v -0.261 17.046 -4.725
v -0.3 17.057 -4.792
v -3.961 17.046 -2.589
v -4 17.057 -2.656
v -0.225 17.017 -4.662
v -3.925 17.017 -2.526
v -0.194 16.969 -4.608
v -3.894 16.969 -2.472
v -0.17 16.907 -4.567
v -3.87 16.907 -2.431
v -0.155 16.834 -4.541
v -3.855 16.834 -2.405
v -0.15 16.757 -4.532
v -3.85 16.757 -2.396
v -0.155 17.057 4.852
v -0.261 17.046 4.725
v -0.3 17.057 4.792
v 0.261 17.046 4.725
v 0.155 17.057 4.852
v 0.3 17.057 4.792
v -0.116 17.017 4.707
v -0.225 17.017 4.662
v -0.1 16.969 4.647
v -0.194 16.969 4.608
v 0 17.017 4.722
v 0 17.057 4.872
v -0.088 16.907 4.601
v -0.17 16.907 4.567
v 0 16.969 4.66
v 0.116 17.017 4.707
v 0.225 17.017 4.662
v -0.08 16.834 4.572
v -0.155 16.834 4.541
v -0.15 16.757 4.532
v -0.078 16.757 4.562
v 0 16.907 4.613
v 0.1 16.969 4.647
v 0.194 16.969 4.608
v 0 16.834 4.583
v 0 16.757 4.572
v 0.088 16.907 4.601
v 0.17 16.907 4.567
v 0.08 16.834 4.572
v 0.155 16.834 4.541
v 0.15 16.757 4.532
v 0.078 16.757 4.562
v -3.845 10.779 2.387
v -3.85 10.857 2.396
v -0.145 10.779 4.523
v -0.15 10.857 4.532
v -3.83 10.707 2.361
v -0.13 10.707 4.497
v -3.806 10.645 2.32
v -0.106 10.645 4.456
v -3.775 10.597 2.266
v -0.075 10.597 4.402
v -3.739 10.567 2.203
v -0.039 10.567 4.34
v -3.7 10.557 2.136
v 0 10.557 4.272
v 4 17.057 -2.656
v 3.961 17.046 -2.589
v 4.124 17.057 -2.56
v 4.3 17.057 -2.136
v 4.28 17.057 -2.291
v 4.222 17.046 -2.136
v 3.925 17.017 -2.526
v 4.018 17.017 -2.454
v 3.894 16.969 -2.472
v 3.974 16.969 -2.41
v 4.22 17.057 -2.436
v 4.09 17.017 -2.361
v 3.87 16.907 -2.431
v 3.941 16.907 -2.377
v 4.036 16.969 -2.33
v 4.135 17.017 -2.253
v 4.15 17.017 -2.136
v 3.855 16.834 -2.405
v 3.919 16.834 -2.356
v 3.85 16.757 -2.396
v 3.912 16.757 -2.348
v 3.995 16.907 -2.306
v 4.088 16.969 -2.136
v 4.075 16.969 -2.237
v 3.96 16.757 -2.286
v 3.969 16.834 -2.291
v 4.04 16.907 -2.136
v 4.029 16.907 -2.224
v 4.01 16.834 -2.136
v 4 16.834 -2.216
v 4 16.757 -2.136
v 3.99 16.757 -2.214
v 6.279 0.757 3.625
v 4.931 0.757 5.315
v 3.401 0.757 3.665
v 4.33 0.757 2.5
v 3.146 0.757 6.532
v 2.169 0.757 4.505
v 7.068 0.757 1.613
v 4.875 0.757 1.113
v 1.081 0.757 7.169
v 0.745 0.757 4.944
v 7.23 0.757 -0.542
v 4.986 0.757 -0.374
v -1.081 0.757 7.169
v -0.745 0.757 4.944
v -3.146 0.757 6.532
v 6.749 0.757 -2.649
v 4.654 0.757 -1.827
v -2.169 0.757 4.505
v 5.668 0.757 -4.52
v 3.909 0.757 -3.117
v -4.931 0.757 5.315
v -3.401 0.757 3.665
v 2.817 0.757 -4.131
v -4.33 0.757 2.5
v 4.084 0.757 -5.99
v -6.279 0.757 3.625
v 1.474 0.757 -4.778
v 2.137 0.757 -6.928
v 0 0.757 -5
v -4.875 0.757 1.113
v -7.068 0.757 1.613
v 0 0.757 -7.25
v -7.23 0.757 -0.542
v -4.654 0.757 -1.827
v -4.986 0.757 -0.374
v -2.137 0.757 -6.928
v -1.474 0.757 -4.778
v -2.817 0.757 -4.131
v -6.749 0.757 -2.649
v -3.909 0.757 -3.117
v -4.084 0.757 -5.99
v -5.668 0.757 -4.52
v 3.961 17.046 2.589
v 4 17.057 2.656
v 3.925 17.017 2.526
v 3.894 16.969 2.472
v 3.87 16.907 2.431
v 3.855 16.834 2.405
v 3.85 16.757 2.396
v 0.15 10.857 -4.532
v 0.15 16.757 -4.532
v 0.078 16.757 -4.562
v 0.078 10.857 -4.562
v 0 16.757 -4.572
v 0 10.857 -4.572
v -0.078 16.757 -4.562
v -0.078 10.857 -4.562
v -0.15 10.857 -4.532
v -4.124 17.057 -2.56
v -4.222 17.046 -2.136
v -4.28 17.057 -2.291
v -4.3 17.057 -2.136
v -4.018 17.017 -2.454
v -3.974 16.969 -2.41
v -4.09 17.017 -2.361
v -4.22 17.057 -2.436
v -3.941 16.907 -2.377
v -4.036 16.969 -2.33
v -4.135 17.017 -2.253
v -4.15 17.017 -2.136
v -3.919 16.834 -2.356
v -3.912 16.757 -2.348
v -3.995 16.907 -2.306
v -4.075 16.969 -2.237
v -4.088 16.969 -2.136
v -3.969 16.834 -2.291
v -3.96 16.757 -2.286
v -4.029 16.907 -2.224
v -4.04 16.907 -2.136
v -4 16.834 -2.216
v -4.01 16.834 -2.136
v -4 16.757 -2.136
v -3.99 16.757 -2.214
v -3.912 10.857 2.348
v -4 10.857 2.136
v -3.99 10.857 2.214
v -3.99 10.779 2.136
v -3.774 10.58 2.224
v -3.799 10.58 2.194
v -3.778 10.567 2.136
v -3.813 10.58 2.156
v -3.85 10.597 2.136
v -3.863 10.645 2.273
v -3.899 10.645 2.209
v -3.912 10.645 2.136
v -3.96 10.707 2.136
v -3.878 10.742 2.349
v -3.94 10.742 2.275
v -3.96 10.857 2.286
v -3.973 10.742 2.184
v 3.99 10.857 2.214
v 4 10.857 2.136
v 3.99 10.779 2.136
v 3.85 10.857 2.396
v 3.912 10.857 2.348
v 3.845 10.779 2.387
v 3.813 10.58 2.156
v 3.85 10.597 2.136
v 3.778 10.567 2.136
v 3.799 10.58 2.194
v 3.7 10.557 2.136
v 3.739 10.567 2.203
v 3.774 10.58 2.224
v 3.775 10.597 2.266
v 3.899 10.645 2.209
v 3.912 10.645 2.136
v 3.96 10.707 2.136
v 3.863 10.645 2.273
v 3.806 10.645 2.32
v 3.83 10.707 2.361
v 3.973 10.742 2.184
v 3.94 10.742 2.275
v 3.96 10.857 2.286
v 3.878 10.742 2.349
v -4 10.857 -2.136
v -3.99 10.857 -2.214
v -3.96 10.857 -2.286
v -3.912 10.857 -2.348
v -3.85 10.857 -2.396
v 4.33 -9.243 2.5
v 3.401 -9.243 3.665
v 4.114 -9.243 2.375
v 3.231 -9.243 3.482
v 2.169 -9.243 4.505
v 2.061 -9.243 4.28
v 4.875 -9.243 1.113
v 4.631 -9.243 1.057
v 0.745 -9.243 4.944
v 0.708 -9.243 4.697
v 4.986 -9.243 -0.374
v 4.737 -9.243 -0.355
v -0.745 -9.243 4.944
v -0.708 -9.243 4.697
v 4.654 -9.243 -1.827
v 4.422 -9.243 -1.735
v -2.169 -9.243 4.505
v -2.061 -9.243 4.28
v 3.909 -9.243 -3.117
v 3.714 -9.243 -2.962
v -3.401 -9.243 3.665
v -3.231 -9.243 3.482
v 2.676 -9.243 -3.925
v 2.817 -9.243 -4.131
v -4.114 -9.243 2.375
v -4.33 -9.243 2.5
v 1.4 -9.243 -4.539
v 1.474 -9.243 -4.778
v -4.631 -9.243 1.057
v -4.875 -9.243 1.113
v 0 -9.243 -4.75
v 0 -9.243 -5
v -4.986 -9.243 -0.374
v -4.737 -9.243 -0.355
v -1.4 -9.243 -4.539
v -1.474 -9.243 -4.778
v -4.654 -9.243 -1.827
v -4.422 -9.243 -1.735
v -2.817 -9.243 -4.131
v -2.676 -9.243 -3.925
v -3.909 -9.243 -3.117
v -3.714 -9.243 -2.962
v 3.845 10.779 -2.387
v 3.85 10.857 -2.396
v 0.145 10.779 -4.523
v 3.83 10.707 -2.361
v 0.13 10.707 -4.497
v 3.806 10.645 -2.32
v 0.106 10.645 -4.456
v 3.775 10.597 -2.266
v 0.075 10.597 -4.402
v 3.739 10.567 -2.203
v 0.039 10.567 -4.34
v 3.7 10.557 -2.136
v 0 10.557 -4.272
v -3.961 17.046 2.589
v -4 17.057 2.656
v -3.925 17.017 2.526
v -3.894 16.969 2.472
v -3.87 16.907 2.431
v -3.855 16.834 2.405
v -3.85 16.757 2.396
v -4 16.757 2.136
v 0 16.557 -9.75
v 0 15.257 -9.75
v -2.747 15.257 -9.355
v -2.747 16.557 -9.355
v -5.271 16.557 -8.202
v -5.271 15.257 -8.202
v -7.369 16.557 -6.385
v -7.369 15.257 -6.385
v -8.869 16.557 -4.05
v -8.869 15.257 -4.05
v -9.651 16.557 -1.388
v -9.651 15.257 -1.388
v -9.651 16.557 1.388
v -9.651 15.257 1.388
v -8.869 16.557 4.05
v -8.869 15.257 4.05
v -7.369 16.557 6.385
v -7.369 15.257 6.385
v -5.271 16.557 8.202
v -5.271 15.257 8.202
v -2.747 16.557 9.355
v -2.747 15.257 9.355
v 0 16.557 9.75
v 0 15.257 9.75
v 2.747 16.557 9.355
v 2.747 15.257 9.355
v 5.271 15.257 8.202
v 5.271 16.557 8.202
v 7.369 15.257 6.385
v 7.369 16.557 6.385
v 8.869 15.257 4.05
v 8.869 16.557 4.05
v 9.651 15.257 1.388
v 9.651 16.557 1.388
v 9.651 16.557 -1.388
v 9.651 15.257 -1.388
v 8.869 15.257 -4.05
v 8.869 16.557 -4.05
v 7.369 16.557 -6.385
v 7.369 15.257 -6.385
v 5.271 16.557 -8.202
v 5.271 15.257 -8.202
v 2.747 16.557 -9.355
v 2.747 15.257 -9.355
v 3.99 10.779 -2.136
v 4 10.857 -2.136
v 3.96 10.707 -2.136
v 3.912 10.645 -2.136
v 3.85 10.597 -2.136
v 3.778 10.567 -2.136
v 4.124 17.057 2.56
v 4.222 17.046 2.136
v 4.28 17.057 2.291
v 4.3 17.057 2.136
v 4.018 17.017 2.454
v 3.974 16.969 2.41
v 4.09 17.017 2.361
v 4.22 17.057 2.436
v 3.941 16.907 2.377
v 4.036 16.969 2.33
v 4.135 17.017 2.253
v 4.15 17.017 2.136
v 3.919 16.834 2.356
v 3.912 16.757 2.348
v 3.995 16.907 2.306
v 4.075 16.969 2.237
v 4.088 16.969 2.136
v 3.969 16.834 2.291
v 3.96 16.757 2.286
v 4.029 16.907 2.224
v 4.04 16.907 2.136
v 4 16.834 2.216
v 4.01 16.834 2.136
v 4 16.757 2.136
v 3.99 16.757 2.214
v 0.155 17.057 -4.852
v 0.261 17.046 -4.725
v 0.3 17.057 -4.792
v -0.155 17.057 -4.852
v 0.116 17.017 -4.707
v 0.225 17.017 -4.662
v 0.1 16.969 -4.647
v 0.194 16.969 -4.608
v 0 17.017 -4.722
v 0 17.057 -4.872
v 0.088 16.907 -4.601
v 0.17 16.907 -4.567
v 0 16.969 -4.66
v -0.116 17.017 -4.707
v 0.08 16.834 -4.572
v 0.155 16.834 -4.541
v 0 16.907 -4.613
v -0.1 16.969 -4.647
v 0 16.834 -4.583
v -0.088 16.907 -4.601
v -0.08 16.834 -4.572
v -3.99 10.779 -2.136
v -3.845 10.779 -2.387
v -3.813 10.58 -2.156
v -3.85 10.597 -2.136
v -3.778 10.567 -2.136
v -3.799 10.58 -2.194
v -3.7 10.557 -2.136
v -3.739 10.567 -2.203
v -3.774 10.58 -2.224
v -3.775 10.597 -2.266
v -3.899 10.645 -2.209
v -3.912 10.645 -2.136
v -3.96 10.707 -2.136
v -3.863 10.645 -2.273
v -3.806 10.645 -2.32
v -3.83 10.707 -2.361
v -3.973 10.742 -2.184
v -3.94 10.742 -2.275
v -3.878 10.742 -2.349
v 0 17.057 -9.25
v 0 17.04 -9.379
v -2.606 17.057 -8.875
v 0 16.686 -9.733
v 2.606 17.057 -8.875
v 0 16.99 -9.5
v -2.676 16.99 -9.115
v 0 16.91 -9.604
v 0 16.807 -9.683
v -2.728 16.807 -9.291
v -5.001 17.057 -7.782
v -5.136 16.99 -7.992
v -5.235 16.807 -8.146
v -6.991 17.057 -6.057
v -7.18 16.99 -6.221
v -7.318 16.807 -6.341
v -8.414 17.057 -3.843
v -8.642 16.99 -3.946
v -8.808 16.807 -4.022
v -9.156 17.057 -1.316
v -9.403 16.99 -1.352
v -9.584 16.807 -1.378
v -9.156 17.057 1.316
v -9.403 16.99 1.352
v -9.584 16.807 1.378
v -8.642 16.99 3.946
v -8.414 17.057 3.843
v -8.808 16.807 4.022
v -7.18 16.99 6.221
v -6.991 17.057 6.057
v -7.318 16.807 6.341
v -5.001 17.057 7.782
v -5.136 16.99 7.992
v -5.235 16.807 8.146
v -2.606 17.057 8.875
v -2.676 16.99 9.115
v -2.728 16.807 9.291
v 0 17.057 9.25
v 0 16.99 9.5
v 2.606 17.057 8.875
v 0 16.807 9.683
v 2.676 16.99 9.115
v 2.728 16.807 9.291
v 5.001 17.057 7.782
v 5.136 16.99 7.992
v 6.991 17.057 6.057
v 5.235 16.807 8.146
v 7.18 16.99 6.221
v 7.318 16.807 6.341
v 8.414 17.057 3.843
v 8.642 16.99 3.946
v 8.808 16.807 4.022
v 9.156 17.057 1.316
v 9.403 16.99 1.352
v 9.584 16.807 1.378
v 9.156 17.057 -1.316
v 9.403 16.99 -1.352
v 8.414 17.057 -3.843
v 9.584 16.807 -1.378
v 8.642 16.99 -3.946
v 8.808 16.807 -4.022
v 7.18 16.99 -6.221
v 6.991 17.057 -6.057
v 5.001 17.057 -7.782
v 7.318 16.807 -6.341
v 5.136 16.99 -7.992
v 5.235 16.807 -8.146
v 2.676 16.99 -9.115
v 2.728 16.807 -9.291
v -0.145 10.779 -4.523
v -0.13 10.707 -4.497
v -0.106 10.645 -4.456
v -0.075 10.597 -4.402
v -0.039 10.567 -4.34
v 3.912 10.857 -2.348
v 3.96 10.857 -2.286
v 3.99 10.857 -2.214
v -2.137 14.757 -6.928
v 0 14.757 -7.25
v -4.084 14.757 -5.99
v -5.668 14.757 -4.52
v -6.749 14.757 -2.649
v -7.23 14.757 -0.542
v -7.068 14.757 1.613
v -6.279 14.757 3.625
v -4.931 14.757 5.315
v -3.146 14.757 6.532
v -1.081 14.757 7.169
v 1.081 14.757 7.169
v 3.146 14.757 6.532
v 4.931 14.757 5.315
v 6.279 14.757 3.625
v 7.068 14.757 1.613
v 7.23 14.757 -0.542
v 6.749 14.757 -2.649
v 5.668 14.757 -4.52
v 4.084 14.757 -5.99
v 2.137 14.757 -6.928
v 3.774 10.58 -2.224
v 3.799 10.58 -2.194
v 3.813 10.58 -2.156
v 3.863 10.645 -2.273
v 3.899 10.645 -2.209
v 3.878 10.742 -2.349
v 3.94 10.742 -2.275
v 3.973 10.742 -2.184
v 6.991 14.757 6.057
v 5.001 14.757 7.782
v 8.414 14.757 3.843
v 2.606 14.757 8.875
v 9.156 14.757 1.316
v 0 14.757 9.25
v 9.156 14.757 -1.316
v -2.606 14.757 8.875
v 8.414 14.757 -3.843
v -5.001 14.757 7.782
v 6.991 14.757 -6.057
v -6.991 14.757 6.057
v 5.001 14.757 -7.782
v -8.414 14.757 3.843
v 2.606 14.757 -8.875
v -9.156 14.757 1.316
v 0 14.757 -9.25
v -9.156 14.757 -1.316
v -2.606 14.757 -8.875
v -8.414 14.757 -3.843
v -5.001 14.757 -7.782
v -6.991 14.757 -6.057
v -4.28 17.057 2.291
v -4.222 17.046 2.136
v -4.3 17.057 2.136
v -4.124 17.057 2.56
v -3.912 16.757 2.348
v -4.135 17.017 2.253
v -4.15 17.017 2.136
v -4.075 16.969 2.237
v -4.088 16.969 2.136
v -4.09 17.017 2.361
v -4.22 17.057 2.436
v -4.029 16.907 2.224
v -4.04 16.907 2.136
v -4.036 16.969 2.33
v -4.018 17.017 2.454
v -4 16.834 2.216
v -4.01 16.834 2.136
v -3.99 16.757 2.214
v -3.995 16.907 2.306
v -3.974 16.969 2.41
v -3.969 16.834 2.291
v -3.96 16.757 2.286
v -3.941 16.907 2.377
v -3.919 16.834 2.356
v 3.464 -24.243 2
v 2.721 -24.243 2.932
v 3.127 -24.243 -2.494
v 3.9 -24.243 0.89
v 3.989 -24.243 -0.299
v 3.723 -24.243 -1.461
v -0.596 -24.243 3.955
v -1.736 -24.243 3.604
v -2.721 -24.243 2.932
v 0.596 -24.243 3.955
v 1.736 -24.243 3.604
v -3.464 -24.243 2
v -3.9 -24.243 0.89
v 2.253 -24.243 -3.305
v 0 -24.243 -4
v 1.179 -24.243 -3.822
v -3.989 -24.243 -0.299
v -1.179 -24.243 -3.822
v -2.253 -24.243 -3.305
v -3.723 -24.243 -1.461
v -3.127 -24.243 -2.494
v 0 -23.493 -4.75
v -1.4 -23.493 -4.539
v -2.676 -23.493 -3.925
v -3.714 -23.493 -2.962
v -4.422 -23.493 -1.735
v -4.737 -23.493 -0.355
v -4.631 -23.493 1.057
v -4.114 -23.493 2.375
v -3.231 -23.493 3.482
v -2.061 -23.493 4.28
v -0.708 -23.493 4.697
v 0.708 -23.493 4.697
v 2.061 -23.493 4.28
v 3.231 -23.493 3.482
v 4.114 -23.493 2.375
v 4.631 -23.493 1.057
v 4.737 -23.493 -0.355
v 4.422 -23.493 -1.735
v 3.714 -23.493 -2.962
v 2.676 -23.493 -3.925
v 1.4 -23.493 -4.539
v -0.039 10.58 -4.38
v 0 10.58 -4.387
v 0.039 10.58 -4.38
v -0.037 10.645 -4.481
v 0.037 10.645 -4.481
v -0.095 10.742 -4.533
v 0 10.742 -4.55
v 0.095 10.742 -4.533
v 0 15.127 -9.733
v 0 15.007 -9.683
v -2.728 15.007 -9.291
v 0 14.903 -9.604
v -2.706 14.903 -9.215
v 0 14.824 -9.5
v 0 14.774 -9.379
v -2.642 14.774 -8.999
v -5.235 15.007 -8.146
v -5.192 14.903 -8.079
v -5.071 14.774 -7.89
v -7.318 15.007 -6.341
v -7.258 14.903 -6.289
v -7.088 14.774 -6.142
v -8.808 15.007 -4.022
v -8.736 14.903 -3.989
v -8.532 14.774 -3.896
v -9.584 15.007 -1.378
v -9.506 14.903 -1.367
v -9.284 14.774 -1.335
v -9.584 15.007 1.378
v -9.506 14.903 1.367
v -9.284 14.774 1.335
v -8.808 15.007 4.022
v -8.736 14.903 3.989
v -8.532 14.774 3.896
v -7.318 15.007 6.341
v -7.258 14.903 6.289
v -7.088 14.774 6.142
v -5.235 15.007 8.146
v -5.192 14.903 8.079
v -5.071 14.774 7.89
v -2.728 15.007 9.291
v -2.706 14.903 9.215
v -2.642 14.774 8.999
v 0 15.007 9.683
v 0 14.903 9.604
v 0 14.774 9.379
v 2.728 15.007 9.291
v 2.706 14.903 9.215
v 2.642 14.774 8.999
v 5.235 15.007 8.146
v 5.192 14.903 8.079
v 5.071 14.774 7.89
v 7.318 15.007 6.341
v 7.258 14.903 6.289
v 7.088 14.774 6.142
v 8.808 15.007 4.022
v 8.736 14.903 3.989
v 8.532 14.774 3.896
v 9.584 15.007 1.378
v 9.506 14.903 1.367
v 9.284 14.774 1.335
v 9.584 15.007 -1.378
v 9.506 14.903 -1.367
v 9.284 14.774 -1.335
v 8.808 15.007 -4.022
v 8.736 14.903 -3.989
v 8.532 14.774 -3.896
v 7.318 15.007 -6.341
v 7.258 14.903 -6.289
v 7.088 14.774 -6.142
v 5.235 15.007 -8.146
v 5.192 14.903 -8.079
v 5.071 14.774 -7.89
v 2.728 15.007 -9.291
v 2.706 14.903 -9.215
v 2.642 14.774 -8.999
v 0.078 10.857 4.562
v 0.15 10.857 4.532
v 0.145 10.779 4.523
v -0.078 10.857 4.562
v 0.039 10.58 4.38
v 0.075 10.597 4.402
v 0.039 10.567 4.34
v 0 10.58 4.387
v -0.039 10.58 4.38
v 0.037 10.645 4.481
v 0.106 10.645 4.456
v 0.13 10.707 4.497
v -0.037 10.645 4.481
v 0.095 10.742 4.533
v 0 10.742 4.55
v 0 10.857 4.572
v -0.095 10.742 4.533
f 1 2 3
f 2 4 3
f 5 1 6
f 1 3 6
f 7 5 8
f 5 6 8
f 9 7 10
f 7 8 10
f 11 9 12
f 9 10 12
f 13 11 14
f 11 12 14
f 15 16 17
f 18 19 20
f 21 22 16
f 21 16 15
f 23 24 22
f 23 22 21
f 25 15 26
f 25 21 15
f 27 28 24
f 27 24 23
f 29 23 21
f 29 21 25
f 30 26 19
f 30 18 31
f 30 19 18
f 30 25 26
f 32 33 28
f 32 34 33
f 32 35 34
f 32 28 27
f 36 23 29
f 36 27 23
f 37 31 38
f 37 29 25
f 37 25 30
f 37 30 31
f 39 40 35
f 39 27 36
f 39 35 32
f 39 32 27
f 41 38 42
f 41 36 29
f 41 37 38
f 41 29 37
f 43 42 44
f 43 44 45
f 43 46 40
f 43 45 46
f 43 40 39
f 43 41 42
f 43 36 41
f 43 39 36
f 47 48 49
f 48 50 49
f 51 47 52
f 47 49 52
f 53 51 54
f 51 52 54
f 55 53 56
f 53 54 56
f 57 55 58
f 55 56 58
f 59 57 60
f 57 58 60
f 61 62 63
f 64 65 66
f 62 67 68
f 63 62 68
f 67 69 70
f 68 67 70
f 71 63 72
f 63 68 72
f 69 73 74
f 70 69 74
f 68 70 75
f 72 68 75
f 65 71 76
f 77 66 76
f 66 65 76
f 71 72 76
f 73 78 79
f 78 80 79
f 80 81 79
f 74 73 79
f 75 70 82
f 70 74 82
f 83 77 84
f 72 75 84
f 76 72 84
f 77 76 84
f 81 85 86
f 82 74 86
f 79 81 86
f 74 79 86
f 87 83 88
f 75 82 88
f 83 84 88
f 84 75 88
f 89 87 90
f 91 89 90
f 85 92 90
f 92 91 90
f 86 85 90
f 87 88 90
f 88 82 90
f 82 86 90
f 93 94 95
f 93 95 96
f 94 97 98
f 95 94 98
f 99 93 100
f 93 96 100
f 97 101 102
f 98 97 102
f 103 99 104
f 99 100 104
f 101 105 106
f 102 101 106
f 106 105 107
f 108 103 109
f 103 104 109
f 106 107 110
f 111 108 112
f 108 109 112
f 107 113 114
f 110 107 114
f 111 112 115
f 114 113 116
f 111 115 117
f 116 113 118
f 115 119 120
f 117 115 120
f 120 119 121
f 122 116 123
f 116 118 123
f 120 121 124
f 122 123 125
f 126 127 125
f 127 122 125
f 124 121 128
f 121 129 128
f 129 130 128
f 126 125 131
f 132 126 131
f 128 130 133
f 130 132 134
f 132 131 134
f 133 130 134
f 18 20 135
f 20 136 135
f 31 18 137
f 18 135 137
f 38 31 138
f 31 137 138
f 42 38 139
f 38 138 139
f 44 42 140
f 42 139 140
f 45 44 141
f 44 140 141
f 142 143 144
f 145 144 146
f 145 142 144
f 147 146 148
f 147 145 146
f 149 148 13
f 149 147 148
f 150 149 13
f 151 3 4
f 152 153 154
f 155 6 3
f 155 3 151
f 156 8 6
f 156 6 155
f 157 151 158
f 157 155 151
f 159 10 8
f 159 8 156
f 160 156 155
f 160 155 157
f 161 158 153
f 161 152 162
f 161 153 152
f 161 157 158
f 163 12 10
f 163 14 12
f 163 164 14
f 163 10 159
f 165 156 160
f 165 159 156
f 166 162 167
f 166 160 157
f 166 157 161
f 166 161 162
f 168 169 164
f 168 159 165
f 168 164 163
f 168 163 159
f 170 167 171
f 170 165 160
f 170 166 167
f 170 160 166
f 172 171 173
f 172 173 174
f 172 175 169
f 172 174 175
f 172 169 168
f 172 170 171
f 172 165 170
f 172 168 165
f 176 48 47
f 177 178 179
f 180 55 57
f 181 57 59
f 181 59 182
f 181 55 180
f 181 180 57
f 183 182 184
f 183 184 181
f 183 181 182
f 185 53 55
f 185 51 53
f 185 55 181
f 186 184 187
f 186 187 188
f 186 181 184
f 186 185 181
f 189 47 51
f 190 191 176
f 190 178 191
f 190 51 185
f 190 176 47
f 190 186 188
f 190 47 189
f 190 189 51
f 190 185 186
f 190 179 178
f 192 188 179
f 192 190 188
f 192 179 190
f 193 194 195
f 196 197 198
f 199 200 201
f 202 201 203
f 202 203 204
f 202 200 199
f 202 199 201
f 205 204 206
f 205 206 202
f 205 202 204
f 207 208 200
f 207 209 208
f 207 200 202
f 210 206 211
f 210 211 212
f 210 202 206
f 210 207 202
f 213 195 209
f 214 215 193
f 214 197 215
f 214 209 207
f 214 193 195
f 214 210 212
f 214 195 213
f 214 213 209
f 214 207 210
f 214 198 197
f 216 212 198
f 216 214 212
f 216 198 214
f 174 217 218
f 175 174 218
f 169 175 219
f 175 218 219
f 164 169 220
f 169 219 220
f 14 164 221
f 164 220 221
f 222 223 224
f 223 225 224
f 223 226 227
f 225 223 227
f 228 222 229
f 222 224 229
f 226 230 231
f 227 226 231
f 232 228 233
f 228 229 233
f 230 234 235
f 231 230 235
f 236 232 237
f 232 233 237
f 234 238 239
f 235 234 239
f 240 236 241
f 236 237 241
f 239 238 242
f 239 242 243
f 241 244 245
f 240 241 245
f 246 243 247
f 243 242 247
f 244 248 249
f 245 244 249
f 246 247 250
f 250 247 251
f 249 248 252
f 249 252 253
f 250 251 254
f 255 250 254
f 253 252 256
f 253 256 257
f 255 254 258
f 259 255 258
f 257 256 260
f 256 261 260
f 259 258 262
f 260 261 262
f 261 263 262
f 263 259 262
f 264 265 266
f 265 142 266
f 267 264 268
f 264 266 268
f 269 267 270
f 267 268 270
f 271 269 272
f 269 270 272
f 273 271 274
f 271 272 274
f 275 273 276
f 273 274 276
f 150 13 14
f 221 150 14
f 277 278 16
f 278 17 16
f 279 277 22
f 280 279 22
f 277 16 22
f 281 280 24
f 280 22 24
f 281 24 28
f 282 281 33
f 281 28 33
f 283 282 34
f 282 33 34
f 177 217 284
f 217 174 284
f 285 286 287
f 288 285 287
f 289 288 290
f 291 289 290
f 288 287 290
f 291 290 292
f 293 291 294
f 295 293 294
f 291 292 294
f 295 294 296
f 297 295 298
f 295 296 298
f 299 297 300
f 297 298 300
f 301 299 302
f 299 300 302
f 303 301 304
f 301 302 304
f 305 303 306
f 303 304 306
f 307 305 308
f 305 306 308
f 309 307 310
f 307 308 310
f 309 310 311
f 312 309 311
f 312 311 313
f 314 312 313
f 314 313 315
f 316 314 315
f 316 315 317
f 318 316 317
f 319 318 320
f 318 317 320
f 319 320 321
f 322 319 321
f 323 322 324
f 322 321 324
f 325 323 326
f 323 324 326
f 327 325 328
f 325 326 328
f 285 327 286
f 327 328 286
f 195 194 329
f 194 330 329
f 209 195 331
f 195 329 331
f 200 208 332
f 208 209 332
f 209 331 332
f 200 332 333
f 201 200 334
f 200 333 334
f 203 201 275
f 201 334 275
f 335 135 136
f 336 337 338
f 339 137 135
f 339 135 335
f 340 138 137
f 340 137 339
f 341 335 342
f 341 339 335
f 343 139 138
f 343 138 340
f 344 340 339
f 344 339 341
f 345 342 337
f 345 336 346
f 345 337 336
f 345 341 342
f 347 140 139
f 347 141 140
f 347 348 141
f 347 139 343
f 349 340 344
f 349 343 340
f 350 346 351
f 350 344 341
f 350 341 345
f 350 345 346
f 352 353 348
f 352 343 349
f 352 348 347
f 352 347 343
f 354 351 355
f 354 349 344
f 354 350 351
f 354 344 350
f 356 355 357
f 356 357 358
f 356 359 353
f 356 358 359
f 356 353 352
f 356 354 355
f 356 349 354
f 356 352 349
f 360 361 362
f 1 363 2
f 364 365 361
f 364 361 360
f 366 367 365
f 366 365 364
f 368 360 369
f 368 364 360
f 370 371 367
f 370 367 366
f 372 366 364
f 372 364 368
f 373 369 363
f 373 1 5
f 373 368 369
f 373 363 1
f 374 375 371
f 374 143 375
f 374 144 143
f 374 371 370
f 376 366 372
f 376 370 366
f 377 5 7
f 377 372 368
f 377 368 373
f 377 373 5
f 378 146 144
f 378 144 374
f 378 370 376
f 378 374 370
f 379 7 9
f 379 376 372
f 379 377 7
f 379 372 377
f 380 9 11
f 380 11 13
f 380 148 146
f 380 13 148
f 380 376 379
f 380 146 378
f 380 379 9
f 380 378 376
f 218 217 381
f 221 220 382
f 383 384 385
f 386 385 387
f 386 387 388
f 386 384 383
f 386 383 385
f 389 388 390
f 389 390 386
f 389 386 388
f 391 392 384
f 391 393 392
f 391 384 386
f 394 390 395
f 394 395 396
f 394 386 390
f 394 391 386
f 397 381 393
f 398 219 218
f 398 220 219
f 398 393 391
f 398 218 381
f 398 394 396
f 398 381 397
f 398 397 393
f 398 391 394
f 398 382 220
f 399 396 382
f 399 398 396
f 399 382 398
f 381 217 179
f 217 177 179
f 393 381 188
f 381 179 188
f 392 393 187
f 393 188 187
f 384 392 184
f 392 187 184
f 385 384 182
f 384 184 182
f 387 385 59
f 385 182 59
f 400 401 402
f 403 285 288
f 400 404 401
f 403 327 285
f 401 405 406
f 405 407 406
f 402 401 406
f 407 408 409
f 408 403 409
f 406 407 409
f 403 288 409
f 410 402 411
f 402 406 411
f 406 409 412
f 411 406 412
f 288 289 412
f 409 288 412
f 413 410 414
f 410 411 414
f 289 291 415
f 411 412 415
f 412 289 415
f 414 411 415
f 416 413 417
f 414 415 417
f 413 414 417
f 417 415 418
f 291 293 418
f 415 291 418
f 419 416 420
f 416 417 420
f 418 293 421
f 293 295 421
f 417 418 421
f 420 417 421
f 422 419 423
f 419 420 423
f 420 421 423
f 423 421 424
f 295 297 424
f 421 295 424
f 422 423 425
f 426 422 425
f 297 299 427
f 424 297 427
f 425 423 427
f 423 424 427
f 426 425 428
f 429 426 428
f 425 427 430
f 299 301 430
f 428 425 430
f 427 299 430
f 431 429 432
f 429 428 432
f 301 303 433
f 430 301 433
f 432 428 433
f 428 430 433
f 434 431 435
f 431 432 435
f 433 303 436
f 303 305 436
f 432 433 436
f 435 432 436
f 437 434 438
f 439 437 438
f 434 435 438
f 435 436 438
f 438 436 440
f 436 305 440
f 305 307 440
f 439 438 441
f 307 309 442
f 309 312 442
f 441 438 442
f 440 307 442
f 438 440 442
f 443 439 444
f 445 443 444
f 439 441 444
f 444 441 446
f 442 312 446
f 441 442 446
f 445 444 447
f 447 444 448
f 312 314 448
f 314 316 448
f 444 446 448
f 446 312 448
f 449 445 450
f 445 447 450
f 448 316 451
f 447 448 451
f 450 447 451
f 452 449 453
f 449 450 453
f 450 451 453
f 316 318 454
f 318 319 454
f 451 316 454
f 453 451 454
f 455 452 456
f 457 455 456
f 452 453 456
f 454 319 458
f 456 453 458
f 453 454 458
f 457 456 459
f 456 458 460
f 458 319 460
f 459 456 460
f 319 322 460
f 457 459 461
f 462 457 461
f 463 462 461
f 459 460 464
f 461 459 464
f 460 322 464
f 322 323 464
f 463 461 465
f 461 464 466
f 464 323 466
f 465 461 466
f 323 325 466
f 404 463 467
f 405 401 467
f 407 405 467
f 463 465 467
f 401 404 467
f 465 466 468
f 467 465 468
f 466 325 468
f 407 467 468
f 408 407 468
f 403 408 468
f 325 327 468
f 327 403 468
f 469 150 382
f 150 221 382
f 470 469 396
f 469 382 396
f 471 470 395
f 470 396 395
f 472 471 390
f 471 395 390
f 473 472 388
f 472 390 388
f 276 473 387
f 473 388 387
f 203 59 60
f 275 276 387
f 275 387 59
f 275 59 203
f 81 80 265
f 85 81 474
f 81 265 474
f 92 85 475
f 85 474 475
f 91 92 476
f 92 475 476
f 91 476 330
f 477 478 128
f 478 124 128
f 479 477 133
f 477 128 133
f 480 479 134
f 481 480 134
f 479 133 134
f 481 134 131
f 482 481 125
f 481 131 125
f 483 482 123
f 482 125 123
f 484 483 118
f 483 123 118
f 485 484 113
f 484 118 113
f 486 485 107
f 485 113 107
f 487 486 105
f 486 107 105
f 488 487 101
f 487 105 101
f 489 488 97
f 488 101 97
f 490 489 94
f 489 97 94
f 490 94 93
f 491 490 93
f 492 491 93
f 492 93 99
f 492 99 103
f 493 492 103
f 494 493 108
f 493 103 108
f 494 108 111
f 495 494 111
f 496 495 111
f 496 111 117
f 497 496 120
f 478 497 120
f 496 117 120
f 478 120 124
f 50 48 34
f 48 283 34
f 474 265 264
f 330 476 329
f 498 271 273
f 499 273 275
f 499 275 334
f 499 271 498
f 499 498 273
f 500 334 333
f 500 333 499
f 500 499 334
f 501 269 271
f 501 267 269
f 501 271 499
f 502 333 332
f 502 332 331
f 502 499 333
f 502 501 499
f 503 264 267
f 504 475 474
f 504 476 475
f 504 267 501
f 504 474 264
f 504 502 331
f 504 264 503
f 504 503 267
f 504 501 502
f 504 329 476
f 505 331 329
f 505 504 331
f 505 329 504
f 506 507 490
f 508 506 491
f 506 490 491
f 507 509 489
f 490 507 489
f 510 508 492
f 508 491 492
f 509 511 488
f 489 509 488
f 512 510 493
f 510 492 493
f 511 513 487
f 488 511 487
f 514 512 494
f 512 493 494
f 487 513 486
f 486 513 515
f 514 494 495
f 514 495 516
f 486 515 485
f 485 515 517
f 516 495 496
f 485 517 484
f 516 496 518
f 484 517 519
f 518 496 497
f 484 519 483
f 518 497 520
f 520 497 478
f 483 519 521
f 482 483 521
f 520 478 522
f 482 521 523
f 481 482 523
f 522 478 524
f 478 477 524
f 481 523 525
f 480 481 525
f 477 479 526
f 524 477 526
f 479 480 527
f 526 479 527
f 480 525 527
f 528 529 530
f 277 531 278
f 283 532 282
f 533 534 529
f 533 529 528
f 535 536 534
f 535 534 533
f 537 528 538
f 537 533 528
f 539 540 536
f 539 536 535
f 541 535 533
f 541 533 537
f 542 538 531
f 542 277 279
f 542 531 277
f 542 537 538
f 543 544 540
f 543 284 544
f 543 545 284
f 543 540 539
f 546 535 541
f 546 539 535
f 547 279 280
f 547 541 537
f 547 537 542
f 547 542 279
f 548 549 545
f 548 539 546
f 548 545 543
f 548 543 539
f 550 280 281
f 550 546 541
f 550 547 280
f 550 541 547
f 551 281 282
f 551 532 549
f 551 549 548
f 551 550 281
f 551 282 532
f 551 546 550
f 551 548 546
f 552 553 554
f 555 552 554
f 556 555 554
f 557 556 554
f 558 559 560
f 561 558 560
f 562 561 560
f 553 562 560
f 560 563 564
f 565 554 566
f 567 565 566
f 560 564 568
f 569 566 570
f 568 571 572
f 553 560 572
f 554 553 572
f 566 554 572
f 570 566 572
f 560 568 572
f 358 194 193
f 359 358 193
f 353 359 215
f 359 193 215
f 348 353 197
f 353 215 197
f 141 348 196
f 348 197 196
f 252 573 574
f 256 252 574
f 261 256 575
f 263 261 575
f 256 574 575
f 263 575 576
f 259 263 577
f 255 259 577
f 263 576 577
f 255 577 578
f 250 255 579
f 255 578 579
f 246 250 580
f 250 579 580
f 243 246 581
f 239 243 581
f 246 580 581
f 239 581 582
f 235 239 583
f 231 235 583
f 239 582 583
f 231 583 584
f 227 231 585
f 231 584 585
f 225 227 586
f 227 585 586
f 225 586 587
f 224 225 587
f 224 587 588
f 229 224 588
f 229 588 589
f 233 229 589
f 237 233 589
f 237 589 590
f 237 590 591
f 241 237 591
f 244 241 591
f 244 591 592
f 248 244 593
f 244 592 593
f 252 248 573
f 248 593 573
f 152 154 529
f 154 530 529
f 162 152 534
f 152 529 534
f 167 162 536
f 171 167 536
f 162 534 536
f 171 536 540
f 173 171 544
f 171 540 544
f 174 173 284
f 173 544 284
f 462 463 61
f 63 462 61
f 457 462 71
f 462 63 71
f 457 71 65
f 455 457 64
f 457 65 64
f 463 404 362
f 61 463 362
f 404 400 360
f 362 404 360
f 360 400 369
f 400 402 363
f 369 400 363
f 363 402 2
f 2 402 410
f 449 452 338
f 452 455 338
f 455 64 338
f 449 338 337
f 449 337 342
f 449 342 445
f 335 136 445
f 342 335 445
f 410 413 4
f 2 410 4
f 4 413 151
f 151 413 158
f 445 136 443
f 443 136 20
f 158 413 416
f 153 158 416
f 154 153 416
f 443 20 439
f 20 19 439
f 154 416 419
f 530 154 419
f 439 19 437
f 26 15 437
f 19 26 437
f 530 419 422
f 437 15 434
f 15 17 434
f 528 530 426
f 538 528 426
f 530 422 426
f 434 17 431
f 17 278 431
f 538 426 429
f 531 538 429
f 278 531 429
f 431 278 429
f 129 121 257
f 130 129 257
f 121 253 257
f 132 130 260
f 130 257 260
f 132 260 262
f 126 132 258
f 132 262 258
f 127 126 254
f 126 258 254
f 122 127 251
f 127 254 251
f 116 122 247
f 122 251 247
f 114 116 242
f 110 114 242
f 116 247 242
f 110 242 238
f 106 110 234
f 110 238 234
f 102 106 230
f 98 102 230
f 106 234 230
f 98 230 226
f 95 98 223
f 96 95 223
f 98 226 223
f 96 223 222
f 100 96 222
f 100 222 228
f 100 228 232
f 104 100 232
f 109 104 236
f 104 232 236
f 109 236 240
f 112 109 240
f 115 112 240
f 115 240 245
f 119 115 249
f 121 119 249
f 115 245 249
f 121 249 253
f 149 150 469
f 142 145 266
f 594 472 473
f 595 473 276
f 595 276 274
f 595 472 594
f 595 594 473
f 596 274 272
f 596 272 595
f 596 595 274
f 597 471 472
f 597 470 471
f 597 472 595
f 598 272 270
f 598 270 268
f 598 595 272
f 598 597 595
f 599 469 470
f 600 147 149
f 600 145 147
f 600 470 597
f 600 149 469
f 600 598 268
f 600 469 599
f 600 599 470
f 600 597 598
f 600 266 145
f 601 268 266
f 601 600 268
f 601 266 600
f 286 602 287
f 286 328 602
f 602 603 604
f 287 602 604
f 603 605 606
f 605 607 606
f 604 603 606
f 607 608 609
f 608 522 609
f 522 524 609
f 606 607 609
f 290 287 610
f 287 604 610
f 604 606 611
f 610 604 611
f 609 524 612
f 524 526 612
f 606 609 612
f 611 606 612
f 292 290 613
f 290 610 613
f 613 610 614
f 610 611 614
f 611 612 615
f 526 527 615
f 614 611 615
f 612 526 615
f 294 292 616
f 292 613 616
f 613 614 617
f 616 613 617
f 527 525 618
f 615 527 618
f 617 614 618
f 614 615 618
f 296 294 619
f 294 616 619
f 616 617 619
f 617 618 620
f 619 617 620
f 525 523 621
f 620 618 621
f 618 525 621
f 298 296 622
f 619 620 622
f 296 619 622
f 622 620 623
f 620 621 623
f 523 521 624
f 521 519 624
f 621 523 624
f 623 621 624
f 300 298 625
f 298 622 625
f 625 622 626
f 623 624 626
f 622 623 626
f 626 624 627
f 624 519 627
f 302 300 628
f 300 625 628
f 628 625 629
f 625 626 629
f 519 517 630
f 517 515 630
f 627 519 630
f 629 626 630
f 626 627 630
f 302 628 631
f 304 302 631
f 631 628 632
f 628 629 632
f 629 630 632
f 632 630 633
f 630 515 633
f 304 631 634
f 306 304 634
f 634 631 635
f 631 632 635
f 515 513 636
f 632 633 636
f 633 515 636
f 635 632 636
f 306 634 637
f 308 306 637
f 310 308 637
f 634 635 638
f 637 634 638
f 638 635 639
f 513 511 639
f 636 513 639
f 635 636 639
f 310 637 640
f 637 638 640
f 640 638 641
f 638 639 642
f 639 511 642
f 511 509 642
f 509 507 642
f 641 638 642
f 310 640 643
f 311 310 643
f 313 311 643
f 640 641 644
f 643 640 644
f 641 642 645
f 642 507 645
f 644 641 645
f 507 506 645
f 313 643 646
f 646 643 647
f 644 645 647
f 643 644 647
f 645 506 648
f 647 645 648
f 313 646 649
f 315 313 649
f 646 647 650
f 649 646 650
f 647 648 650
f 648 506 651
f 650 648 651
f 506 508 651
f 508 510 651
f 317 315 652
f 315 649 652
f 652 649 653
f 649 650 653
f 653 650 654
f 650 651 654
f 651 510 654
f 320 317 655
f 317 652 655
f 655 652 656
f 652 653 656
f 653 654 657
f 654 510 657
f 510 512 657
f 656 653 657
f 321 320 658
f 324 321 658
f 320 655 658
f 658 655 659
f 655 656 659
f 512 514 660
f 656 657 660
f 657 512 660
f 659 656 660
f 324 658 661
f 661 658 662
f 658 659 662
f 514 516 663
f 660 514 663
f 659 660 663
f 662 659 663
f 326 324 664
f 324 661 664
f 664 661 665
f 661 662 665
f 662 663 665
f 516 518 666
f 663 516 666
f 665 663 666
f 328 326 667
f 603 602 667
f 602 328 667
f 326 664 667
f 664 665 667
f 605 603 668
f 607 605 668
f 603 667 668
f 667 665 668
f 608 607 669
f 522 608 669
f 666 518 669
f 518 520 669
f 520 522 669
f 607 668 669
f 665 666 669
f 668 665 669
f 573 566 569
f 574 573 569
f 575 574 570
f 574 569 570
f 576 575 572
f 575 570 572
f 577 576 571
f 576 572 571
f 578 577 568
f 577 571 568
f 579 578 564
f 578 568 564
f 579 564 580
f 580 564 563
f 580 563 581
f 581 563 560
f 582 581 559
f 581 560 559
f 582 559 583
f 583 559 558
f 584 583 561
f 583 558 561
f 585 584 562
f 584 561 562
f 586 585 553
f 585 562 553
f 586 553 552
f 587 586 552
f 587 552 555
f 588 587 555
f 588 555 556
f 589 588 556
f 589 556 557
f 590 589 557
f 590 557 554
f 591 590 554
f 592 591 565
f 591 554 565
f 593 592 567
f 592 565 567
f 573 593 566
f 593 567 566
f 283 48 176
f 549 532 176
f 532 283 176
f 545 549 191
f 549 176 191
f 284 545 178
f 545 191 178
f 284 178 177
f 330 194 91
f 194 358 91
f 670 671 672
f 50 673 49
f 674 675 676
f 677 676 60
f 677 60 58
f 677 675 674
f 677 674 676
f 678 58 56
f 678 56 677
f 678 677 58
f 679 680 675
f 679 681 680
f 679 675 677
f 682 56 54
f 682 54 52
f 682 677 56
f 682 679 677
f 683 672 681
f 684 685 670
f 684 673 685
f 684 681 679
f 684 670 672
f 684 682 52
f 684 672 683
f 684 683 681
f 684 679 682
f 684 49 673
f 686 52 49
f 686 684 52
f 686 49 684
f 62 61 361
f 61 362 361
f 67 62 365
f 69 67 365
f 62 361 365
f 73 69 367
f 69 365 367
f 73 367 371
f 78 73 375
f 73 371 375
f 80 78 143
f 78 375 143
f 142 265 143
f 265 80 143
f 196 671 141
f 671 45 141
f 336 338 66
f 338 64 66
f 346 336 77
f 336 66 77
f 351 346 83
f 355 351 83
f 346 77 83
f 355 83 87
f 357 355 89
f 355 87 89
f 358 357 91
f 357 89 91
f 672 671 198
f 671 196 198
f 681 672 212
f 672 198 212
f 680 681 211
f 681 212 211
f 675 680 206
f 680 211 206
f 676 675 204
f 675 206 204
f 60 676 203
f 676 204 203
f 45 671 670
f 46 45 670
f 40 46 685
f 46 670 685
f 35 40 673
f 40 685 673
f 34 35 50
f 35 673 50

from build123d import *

# Parameters (mm, degrees)
FILETE1_R             = 0.5
CORTE_EXTRUS_O1_DEPTH = 6.5
FILETE2_R             = 0.3
CHANFRO1_SIZE         = 0.75


with BuildPart() as part:
    # Esboço1 → Revolução1 (revolve)
    with BuildSketch(Plane.XY, mode=Mode.PRIVATE) as revolu_o1_sk:
        Polygon((0, 17.056706853), (9.75, 17.056706853), (9.75, 14.756706853), (7.25, 14.756706853), (7.25, 0.756706853), (5, 0.756706853), (5, -9.243293147), (4.75, -9.243293147), (4.75, -24.243293147), (0, -24.243293147), align=None)
    revolve(revolu_o1_sk.sketch.rotate(Axis((0, -39.808803987, 0), (0, 1, 0)), 90), axis=Axis((0, -39.808803987, 0), (0, 1, 0)))

    # Filete1
    filete1_edges = [part.edges().sort_by_distance(p)[0] for p in [
        (0, 14.756706853, 9.75),
        (0, 17.056706853, 9.75),
    ]]
    fillet(filete1_edges, radius=FILETE1_R)

    # Esboço2 → Corte-extrusão1 (cut)
    with BuildSketch(Plane(origin=(0, 17.056706853, 0), x_dir=(1, 0, 0), z_dir=(0, 1, 0))):
        Polygon((0, 4.618802154), (-4, 2.309401077), (-4, -2.309401077), (0, -4.618802154), (4, -2.309401077), (4, 2.309401077), align=None)
    extrude(amount=-CORTE_EXTRUS_O1_DEPTH, mode=Mode.SUBTRACT)

    # Filete2
    filete2_edges = [part.edges().sort_by_distance(p)[0] for p in [
        (2, 10.556706853, -3.464101615),
        (0, 13.806706853, -4.618802154),
        (4, 10.556706853, 0),
        (4, 13.806706853, -2.309401077),
        (2, 10.556706853, 3.464101615),
        (4, 13.806706853, 2.309401077),
        (-2, 10.556706853, 3.464101615),
        (0, 13.806706853, 4.618802154),
        (-4, 10.556706853, 0),
        (-4, 13.806706853, 2.309401077),
        (-2, 10.556706853, -3.464101615),
        (-4, 13.806706853, -2.309401077),
        (2, 17.056706853, -3.464101615),
        (-2, 17.056706853, -3.464101615),
        (-4, 17.056706853, 0),
        (-2, 17.056706853, 3.464101615),
        (2, 17.056706853, 3.464101615),
        (4, 17.056706853, 0),
    ]]
    fillet(filete2_edges, radius=FILETE2_R)

    # Chanfro1
    chanfro1_edges = [part.edges().sort_by_distance(p)[0] for p in [
        (0, -24.243293147, 4.75),
    ]]
    chamfer(chanfro1_edges, length=CHANFRO1_SIZE)


solid = part.part
